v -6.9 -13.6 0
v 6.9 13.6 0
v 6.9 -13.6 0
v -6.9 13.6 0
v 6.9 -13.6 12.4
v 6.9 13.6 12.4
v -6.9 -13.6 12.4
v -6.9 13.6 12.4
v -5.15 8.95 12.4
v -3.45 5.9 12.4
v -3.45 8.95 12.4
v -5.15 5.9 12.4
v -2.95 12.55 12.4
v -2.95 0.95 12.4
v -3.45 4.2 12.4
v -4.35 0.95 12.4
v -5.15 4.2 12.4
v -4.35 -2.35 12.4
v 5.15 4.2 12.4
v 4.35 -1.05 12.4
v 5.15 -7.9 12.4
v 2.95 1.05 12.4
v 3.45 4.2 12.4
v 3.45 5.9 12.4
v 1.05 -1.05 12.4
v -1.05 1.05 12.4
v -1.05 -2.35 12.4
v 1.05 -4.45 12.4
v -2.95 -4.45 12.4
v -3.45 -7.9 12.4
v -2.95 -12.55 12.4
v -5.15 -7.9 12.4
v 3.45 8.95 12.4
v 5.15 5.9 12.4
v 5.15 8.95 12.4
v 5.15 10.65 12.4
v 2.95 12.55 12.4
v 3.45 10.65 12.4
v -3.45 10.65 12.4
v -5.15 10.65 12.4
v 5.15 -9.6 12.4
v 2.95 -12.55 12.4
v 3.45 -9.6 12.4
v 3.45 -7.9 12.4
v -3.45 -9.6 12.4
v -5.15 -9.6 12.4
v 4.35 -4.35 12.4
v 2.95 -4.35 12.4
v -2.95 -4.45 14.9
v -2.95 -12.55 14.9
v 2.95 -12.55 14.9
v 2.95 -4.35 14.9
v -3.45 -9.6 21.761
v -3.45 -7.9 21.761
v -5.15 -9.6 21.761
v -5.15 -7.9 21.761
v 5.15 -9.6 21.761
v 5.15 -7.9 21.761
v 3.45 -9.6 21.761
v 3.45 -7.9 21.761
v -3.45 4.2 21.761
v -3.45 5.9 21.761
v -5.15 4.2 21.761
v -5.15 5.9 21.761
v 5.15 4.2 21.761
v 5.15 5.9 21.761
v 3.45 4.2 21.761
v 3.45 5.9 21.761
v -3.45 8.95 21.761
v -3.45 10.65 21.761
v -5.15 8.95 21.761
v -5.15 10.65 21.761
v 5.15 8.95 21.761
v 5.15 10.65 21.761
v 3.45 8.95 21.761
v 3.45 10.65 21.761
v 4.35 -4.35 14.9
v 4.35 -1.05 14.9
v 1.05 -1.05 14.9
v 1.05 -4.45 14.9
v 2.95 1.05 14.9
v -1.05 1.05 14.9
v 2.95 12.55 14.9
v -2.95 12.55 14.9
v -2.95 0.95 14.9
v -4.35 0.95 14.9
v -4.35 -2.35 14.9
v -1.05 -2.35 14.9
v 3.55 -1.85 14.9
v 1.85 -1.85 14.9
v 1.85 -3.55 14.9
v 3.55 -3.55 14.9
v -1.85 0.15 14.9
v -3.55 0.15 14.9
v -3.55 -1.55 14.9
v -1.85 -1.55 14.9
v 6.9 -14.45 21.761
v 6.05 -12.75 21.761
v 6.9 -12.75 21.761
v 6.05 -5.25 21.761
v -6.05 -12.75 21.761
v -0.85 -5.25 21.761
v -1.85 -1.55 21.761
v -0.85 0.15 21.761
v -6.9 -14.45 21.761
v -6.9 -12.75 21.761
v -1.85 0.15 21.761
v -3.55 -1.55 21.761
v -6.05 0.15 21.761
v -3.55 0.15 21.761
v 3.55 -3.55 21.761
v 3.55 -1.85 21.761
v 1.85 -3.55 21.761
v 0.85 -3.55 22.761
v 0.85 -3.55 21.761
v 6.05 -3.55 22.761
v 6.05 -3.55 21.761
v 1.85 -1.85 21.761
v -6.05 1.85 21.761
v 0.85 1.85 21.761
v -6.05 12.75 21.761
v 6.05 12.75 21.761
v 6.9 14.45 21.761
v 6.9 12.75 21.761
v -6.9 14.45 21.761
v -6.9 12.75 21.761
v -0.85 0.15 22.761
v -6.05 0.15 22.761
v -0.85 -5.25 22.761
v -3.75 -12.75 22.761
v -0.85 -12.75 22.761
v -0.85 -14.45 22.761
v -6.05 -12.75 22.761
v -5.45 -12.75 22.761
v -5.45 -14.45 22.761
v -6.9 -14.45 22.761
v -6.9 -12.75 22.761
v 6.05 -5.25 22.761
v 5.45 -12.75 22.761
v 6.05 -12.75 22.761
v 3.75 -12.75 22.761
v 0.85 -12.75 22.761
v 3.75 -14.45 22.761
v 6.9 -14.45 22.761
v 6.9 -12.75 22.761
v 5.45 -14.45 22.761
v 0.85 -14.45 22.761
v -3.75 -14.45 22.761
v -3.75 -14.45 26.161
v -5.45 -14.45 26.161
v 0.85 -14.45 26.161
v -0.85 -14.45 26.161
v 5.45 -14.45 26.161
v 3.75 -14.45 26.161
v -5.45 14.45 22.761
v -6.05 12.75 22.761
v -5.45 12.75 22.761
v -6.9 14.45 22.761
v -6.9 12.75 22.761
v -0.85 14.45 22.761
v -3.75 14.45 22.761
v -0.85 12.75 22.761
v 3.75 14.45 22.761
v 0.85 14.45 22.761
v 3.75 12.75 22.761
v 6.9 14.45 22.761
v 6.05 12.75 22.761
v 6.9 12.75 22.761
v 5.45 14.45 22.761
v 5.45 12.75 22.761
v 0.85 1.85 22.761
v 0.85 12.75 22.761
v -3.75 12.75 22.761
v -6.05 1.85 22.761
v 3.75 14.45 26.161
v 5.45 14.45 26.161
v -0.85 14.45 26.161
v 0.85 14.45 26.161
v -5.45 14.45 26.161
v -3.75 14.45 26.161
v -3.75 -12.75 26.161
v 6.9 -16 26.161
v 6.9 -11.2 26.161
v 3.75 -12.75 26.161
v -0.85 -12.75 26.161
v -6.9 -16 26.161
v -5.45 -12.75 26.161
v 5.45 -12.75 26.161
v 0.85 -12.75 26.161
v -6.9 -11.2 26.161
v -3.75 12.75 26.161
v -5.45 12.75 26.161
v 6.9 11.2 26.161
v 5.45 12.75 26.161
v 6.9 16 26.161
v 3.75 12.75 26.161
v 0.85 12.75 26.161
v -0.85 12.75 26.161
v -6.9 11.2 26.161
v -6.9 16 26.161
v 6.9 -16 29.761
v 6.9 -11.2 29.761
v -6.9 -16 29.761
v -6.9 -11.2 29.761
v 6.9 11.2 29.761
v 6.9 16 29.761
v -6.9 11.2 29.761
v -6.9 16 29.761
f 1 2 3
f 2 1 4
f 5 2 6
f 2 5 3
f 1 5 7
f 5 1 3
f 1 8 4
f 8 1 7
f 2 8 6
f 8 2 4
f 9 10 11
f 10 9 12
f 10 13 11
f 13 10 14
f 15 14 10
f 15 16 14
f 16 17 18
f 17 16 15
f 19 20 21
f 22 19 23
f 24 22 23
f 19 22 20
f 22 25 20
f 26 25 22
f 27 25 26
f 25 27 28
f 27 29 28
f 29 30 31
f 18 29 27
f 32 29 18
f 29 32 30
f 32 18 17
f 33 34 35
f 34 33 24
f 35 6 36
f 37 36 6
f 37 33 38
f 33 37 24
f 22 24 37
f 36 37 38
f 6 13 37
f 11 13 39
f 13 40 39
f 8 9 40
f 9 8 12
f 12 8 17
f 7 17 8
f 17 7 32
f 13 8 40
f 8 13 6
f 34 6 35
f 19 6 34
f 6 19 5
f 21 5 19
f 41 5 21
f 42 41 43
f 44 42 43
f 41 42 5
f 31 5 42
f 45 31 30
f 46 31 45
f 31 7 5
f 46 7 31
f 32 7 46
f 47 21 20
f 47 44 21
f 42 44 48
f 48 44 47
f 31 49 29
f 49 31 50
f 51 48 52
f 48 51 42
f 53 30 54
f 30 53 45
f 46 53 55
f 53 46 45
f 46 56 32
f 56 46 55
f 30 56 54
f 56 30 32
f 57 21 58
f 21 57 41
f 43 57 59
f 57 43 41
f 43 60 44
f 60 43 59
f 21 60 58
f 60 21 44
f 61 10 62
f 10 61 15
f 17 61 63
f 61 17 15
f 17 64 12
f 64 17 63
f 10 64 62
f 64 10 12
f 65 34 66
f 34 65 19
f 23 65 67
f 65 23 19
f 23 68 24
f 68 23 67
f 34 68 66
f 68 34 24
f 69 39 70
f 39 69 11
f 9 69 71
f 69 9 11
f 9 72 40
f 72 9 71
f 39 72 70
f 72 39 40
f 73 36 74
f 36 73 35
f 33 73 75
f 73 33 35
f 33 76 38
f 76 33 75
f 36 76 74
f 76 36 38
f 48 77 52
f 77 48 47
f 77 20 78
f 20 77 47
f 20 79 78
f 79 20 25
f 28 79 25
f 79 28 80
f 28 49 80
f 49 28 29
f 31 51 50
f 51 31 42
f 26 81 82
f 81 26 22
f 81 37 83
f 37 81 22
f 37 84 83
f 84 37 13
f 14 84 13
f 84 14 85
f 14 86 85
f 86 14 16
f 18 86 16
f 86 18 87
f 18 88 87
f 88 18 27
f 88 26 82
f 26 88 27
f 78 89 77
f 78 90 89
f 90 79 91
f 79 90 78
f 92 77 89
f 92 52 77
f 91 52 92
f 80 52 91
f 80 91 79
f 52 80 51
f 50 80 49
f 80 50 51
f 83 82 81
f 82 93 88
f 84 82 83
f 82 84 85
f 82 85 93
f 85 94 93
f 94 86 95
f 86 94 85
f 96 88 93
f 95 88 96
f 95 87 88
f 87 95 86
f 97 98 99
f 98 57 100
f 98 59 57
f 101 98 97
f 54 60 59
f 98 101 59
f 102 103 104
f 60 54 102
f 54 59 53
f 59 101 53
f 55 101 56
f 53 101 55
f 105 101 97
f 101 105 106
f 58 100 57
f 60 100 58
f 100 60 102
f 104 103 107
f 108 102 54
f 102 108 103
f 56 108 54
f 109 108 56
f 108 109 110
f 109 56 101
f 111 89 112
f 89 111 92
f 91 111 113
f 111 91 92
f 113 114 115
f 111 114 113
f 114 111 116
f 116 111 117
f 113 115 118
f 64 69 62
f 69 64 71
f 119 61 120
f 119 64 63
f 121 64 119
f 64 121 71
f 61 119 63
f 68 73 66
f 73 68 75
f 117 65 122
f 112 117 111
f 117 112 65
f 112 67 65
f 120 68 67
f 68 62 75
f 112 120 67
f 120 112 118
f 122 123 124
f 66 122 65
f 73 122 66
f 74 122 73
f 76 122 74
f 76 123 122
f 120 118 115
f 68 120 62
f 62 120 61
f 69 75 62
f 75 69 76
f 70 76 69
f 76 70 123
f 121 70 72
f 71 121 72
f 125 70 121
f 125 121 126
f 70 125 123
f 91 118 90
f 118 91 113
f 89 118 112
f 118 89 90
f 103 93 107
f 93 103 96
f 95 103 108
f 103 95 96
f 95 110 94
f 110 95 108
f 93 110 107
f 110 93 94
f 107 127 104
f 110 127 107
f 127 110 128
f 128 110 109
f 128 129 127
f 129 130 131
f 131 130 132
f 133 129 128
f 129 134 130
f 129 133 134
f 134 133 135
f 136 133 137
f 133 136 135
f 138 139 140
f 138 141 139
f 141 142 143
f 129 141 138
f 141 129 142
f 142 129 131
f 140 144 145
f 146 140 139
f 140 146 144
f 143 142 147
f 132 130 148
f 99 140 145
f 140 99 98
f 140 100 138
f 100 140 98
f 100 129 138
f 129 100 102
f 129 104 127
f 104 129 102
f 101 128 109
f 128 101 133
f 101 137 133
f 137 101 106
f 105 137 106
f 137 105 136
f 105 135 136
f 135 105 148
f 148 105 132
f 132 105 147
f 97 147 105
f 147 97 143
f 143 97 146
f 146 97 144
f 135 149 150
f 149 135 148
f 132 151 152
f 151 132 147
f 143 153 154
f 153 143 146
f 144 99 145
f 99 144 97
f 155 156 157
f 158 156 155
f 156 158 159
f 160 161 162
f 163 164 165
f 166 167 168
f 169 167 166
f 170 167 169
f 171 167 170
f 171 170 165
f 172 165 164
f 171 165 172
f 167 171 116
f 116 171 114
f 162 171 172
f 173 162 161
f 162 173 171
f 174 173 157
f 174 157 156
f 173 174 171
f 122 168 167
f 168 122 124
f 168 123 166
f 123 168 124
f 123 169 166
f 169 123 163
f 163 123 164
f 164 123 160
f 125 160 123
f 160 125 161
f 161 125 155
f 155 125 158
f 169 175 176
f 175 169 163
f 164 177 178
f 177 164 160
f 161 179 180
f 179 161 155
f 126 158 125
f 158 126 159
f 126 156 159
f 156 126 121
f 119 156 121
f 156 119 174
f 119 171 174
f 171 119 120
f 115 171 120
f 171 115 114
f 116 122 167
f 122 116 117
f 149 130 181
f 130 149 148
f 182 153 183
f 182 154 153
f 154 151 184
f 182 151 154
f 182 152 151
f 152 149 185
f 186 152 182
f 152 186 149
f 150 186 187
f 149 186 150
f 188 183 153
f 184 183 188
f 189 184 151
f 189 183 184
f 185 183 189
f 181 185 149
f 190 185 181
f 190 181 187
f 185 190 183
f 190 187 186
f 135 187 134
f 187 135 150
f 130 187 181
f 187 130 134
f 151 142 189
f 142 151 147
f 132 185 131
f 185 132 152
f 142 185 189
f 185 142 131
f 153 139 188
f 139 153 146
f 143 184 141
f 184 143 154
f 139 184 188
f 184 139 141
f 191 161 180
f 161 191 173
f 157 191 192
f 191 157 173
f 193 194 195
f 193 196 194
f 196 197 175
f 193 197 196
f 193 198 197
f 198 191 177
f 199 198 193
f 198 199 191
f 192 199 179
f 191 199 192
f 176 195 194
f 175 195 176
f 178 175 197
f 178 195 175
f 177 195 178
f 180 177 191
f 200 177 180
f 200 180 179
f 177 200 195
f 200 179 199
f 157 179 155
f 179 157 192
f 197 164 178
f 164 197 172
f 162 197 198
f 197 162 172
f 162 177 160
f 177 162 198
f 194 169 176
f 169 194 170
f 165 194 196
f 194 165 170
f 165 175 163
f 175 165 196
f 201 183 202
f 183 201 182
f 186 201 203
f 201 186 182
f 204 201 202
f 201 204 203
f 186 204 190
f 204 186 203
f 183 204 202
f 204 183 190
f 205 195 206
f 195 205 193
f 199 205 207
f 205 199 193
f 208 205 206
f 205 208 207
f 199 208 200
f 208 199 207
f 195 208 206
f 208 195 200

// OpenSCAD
// Generated by SolidPython 0.4.2 on 2020-09-29 23:20:25
//!OpenSCAD

scale(v = 0.0100000000) {
	translate(v = [-690, -1360, 0]) {
		union() {
			color(c = [0.4000000000, 0.4000000000, 0.4000000000]) {
				translate(v = [0, 0, 0]) {
					linear_extrude(height = 1000.0000000000) {
						polygon(paths = [[0, 1, 2, 3]], points = [[0, 0], [0, 2720], [1380, 2720], [1380, 0]]);
					}
				}
			}
			color(c = [0.2000000000, 0.6000000000, 0.2000000000]) {
				translate(v = [0, 0, 1000.0000000000]) {
					linear_extrude(height = 120.0000000000) {
						polygon(paths = [[0, 1, 2, 3]], points = [[0, 1305], [0, 2720], [1380, 2720], [1380, 1305]]);
					}
				}
			}
			color(c = [0.4000000000, 0.4000000000, 0.4000000000]) {
				translate(v = [0, 0, 1000.0000000000]) {
					linear_extrude(height = 120.0000000000) {
						polygon(paths = [[0, 1, 2, 3]], points = [[0, 0], [0, 1305], [1380, 1305], [1380, 0]]);
					}
				}
			}
			color(c = [0.9000000000, 0.6000000000, 0.6000000000]) {
				translate(v = [0, 0, 1120.0000000000]) {
					linear_extrude(height = 120.0000000000) {
						polygon(paths = [[0, 1, 2, 3]], points = [[135, 1615], [135, 2485], [395, 2485], [395, 1615]]);
					}
				}
			}
			color(c = [0.9000000000, 0.6000000000, 0.6000000000]) {
				translate(v = [0, 0, 1120.0000000000]) {
					linear_extrude(height = 120.0000000000) {
						polygon(paths = [[0, 1, 2, 3]], points = [[985, 1615], [985, 2485], [1245, 2485], [1245, 1615]]);
					}
				}
			}
			color(c = [0.9000000000, 0.6000000000, 0.9000000000]) {
				translate(v = [0, 0, 1120.0000000000]) {
					linear_extrude(height = 120.0000000000) {
						polygon(paths = [[0, 1, 2, 3]], points = [[135, 235], [135, 785], [395, 785], [395, 235]]);
					}
				}
			}
			color(c = [0.9000000000, 0.6000000000, 0.9000000000]) {
				translate(v = [0, 0, 1120.0000000000]) {
					linear_extrude(height = 120.0000000000) {
						polygon(paths = [[0, 1, 2, 3]], points = [[985, 235], [985, 785], [1245, 785], [1245, 235]]);
					}
				}
			}
			color(c = [0.2000000000, 0.6000000000, 0.2000000000]) {
				translate(v = [0, 0, 1120.0000000000]) {
					linear_extrude(height = 120.0000000000) {
						difference() {
							polygon(paths = [[0, 1, 2, 3]], points = [[0, 1305], [0, 2720], [1380, 2720], [1380, 1305]]);
							polygon(paths = [[0, 1, 2, 3]], points = [[135, 1615], [395, 1615], [395, 2485], [135, 2485]]);
							polygon(paths = [[0, 1, 2, 3]], points = [[985, 1615], [1245, 1615], [1245, 2485], [985, 2485]]);
						}
					}
				}
			}
			color(c = [0.4000000000, 0.4000000000, 0.4000000000]) {
				translate(v = [0, 0, 1120.0000000000]) {
					linear_extrude(height = 120.0000000000) {
						difference() {
							polygon(paths = [[0, 1, 2, 3]], points = [[0, 0], [0, 1305], [1380, 1305], [1380, 0]]);
							polygon(paths = [[0, 1, 2, 3]], points = [[135, 235], [395, 235], [395, 785], [135, 785]]);
							polygon(paths = [[0, 1, 2, 3]], points = [[985, 235], [1245, 235], [1245, 785], [985, 785]]);
						}
					}
				}
			}
			color(c = [0.1000000000, 0.1000000000, 0.1000000000]) {
				translate(v = [0, 0, 1240.0000000000]) {
					linear_extrude(height = 70.0000000000) {
						polygon(paths = [[0, 1, 2, 3]], points = [[175, 400], [175, 570], [345, 570], [345, 400]]);
					}
				}
			}
			color(c = [0.1000000000, 0.1000000000, 0.1000000000]) {
				translate(v = [0, 0, 1240.0000000000]) {
					linear_extrude(height = 70.0000000000) {
						polygon(paths = [[0, 1, 2, 3]], points = [[1035, 400], [1035, 570], [1205, 570], [1205, 400]]);
					}
				}
			}
			color(c = [0.1000000000, 0.1000000000, 0.1000000000]) {
				translate(v = [0, 0, 1240.0000000000]) {
					linear_extrude(height = 70.0000000000) {
						polygon(paths = [[0, 1, 2, 3]], points = [[175, 1780], [175, 1950], [345, 1950], [345, 1780]]);
					}
				}
			}
			color(c = [0.1000000000, 0.1000000000, 0.1000000000]) {
				translate(v = [0, 0, 1240.0000000000]) {
					linear_extrude(height = 70.0000000000) {
						polygon(paths = [[0, 1, 2, 3]], points = [[1035, 1780], [1035, 1950], [1205, 1950], [1205, 1780]]);
					}
				}
			}
			color(c = [0.1000000000, 0.1000000000, 0.1000000000]) {
				translate(v = [0, 0, 1240.0000000000]) {
					linear_extrude(height = 70.0000000000) {
						polygon(paths = [[0, 1, 2, 3]], points = [[175, 2255], [175, 2425], [345, 2425], [345, 2255]]);
					}
				}
			}
			color(c = [0.1000000000, 0.1000000000, 0.1000000000]) {
				translate(v = [0, 0, 1240.0000000000]) {
					linear_extrude(height = 70.0000000000) {
						polygon(paths = [[0, 1, 2, 3]], points = [[1035, 2255], [1035, 2425], [1205, 2425], [1205, 2255]]);
					}
				}
			}
			color(c = [1.0000000000, 1.0000000000, 1.0000000000]) {
				translate(v = [0, 0, 1240.0000000000]) {
					linear_extrude(height = 70.0000000000) {
						polygon(paths = [[0, 1, 2, 3, 4, 5, 6, 7]], points = [[395, 105], [395, 915], [795, 915], [795, 1255], [1125, 1255], [1125, 925], [985, 925], [985, 105]]);
					}
				}
			}
			color(c = [1.0000000000, 1.0000000000, 1.0000000000]) {
				translate(v = [0, 0, 1240.0000000000]) {
					linear_extrude(height = 70.0000000000) {
						polygon(paths = [[0, 1, 2, 3, 4, 5, 6, 7]], points = [[255, 1125], [255, 1455], [395, 1455], [395, 2615], [985, 2615], [985, 1465], [585, 1465], [585, 1125]]);
					}
				}
			}
			color(c = [0.1000000000, 0.1000000000, 0.1000000000]) {
				translate(v = [0, 0, 1310.0000000000]) {
					linear_extrude(height = 180.0000000000) {
						polygon(paths = [[0, 1, 2, 3]], points = [[175, 400], [175, 570], [345, 570], [345, 400]]);
					}
				}
			}
			color(c = [0.1000000000, 0.1000000000, 0.1000000000]) {
				translate(v = [0, 0, 1310.0000000000]) {
					linear_extrude(height = 180.0000000000) {
						polygon(paths = [[0, 1, 2, 3]], points = [[1035, 400], [1035, 570], [1205, 570], [1205, 400]]);
					}
				}
			}
			color(c = [0.1000000000, 0.1000000000, 0.1000000000]) {
				translate(v = [0, 0, 1310.0000000000]) {
					linear_extrude(height = 180.0000000000) {
						polygon(paths = [[0, 1, 2, 3]], points = [[175, 1780], [175, 1950], [345, 1950], [345, 1780]]);
					}
				}
			}
			color(c = [0.1000000000, 0.1000000000, 0.1000000000]) {
				translate(v = [0, 0, 1310.0000000000]) {
					linear_extrude(height = 180.0000000000) {
						polygon(paths = [[0, 1, 2, 3]], points = [[1035, 1780], [1035, 1950], [1205, 1950], [1205, 1780]]);
					}
				}
			}
			color(c = [0.1000000000, 0.1000000000, 0.1000000000]) {
				translate(v = [0, 0, 1310.0000000000]) {
					linear_extrude(height = 180.0000000000) {
						polygon(paths = [[0, 1, 2, 3]], points = [[175, 2255], [175, 2425], [345, 2425], [345, 2255]]);
					}
				}
			}
			color(c = [0.1000000000, 0.1000000000, 0.1000000000]) {
				translate(v = [0, 0, 1310.0000000000]) {
					linear_extrude(height = 180.0000000000) {
						polygon(paths = [[0, 1, 2, 3]], points = [[1035, 2255], [1035, 2425], [1205, 2425], [1205, 2255]]);
					}
				}
			}
			color(c = [0.7000000000, 0, 0]) {
				translate(v = [0, 0, 1310.0000000000]) {
					linear_extrude(height = 180.0000000000) {
						polygon(paths = [[0, 1, 2, 3, 4, 5, 6, 7]], points = [[395, 105], [395, 915], [795, 915], [795, 1255], [1125, 1255], [1125, 925], [985, 925], [985, 105]]);
					}
				}
			}
			color(c = [0.7000000000, 0, 0]) {
				translate(v = [0, 0, 1310.0000000000]) {
					linear_extrude(height = 180.0000000000) {
						polygon(paths = [[0, 1, 2, 3, 4, 5, 6, 7]], points = [[255, 1125], [255, 1455], [395, 1455], [395, 2615], [985, 2615], [985, 1465], [585, 1465], [585, 1125]]);
					}
				}
			}
			color(c = [0.1000000000, 0.1000000000, 0.1000000000]) {
				translate(v = [0, 0, 1490.0000000000]) {
					linear_extrude(height = 686.1000000000) {
						polygon(paths = [[0, 1, 2, 3]], points = [[175, 400], [175, 570], [345, 570], [345, 400]]);
					}
				}
			}
			color(c = [0.1000000000, 0.1000000000, 0.1000000000]) {
				translate(v = [0, 0, 1490.0000000000]) {
					linear_extrude(height = 686.1000000000) {
						polygon(paths = [[0, 1, 2, 3]], points = [[1035, 400], [1035, 570], [1205, 570], [1205, 400]]);
					}
				}
			}
			color(c = [0.1000000000, 0.1000000000, 0.1000000000]) {
				translate(v = [0, 0, 1490.0000000000]) {
					linear_extrude(height = 686.1000000000) {
						polygon(paths = [[0, 1, 2, 3]], points = [[875, 1005], [875, 1175], [1045, 1175], [1045, 1005]]);
					}
				}
			}
			color(c = [0.1000000000, 0.1000000000, 0.1000000000]) {
				translate(v = [0, 0, 1490.0000000000]) {
					linear_extrude(height = 686.1000000000) {
						polygon(paths = [[0, 1, 2, 3]], points = [[335, 1205], [335, 1375], [505, 1375], [505, 1205]]);
					}
				}
			}
			color(c = [0.1000000000, 0.1000000000, 0.1000000000]) {
				translate(v = [0, 0, 1490.0000000000]) {
					linear_extrude(height = 686.1000000000) {
						polygon(paths = [[0, 1, 2, 3]], points = [[175, 1780], [175, 1950], [345, 1950], [345, 1780]]);
					}
				}
			}
			color(c = [0.1000000000, 0.1000000000, 0.1000000000]) {
				translate(v = [0, 0, 1490.0000000000]) {
					linear_extrude(height = 686.1000000000) {
						polygon(paths = [[0, 1, 2, 3]], points = [[1035, 1780], [1035, 1950], [1205, 1950], [1205, 1780]]);
					}
				}
			}
			color(c = [0.1000000000, 0.1000000000, 0.1000000000]) {
				translate(v = [0, 0, 1490.0000000000]) {
					linear_extrude(height = 686.1000000000) {
						polygon(paths = [[0, 1, 2, 3]], points = [[175, 2255], [175, 2425], [345, 2425], [345, 2255]]);
					}
				}
			}
			color(c = [0.1000000000, 0.1000000000, 0.1000000000]) {
				translate(v = [0, 0, 1490.0000000000]) {
					linear_extrude(height = 686.1000000000) {
						polygon(paths = [[0, 1, 2, 3]], points = [[1035, 2255], [1035, 2425], [1205, 2425], [1205, 2255]]);
					}
				}
			}
			color(c = [0.9000000000, 0.6000000000, 0.6000000000]) {
				translate(v = [0, 0, 2176.1000000000]) {
					linear_extrude(height = 100.0000000000) {
						polygon(paths = [[0, 1, 2, 3, 4, 5, 6, 7, 8, 9]], points = [[0, -85], [0, 85], [85, 85], [85, 1375], [605, 1375], [605, 835], [1295, 835], [1295, 85], [1380, 85], [1380, -85]]);
					}
				}
			}
			color(c = [0.9000000000, 0.6000000000, 0.6000000000]) {
				translate(v = [0, 0, 2176.1000000000]) {
					linear_extrude(height = 100.0000000000) {
						polygon(paths = [[0, 1, 2, 3, 4, 5, 6, 7, 8, 9]], points = [[775, 1005], [775, 1545], [85, 1545], [85, 2635], [0, 2635], [0, 2805], [1380, 2805], [1380, 2635], [1295, 2635], [1295, 1005]]);
					}
				}
			}
			color(c = [0.5000000000, 0.5000000000, 0.5000000000]) {
				translate(v = [0, 0, 2276.1000000000]) {
					linear_extrude(height = 340.0000000000) {
						polygon(paths = [[0, 1, 2, 3]], points = [[145, -85], [145, 85], [315, 85], [315, -85]]);
					}
				}
			}
			color(c = [0.5000000000, 0.5000000000, 0.5000000000]) {
				translate(v = [0, 0, 2276.1000000000]) {
					linear_extrude(height = 340.0000000000) {
						polygon(paths = [[0, 1, 2, 3]], points = [[605, -85], [605, 85], [775, 85], [775, -85]]);
					}
				}
			}
			color(c = [0.5000000000, 0.5000000000, 0.5000000000]) {
				translate(v = [0, 0, 2276.1000000000]) {
					linear_extrude(height = 340.0000000000) {
						polygon(paths = [[0, 1, 2, 3]], points = [[1065, -85], [1065, 85], [1235, 85], [1235, -85]]);
					}
				}
			}
			color(c = [0.5000000000, 0.5000000000, 0.5000000000]) {
				translate(v = [0, 0, 2276.1000000000]) {
					linear_extrude(height = 340.0000000000) {
						polygon(paths = [[0, 1, 2, 3]], points = [[145, 2635], [145, 2805], [315, 2805], [315, 2635]]);
					}
				}
			}
			color(c = [0.5000000000, 0.5000000000, 0.5000000000]) {
				translate(v = [0, 0, 2276.1000000000]) {
					linear_extrude(height = 340.0000000000) {
						polygon(paths = [[0, 1, 2, 3]], points = [[605, 2635], [605, 2805], [775, 2805], [775, 2635]]);
					}
				}
			}
			color(c = [0.5000000000, 0.5000000000, 0.5000000000]) {
				translate(v = [0, 0, 2276.1000000000]) {
					linear_extrude(height = 340.0000000000) {
						polygon(paths = [[0, 1, 2, 3]], points = [[1065, 2635], [1065, 2805], [1235, 2805], [1235, 2635]]);
					}
				}
			}
			color(c = [0.3000000000, 0.3000000000, 1]) {
				translate(v = [0, 0, 2616.1000000000]) {
					linear_extrude(height = 360.0000000000) {
						polygon(paths = [[0, 1, 2, 3]], points = [[0, -240], [0, 240], [1380, 240], [1380, -240]]);
					}
				}
			}
			color(c = [0.3000000000, 0.3000000000, 1]) {
				translate(v = [0, 0, 2616.1000000000]) {
					linear_extrude(height = 360.0000000000) {
						polygon(paths = [[0, 1, 2, 3]], points = [[0, 2480], [0, 2960], [1380, 2960], [1380, 2480]]);
					}
				}
			}
		}
	}
}
